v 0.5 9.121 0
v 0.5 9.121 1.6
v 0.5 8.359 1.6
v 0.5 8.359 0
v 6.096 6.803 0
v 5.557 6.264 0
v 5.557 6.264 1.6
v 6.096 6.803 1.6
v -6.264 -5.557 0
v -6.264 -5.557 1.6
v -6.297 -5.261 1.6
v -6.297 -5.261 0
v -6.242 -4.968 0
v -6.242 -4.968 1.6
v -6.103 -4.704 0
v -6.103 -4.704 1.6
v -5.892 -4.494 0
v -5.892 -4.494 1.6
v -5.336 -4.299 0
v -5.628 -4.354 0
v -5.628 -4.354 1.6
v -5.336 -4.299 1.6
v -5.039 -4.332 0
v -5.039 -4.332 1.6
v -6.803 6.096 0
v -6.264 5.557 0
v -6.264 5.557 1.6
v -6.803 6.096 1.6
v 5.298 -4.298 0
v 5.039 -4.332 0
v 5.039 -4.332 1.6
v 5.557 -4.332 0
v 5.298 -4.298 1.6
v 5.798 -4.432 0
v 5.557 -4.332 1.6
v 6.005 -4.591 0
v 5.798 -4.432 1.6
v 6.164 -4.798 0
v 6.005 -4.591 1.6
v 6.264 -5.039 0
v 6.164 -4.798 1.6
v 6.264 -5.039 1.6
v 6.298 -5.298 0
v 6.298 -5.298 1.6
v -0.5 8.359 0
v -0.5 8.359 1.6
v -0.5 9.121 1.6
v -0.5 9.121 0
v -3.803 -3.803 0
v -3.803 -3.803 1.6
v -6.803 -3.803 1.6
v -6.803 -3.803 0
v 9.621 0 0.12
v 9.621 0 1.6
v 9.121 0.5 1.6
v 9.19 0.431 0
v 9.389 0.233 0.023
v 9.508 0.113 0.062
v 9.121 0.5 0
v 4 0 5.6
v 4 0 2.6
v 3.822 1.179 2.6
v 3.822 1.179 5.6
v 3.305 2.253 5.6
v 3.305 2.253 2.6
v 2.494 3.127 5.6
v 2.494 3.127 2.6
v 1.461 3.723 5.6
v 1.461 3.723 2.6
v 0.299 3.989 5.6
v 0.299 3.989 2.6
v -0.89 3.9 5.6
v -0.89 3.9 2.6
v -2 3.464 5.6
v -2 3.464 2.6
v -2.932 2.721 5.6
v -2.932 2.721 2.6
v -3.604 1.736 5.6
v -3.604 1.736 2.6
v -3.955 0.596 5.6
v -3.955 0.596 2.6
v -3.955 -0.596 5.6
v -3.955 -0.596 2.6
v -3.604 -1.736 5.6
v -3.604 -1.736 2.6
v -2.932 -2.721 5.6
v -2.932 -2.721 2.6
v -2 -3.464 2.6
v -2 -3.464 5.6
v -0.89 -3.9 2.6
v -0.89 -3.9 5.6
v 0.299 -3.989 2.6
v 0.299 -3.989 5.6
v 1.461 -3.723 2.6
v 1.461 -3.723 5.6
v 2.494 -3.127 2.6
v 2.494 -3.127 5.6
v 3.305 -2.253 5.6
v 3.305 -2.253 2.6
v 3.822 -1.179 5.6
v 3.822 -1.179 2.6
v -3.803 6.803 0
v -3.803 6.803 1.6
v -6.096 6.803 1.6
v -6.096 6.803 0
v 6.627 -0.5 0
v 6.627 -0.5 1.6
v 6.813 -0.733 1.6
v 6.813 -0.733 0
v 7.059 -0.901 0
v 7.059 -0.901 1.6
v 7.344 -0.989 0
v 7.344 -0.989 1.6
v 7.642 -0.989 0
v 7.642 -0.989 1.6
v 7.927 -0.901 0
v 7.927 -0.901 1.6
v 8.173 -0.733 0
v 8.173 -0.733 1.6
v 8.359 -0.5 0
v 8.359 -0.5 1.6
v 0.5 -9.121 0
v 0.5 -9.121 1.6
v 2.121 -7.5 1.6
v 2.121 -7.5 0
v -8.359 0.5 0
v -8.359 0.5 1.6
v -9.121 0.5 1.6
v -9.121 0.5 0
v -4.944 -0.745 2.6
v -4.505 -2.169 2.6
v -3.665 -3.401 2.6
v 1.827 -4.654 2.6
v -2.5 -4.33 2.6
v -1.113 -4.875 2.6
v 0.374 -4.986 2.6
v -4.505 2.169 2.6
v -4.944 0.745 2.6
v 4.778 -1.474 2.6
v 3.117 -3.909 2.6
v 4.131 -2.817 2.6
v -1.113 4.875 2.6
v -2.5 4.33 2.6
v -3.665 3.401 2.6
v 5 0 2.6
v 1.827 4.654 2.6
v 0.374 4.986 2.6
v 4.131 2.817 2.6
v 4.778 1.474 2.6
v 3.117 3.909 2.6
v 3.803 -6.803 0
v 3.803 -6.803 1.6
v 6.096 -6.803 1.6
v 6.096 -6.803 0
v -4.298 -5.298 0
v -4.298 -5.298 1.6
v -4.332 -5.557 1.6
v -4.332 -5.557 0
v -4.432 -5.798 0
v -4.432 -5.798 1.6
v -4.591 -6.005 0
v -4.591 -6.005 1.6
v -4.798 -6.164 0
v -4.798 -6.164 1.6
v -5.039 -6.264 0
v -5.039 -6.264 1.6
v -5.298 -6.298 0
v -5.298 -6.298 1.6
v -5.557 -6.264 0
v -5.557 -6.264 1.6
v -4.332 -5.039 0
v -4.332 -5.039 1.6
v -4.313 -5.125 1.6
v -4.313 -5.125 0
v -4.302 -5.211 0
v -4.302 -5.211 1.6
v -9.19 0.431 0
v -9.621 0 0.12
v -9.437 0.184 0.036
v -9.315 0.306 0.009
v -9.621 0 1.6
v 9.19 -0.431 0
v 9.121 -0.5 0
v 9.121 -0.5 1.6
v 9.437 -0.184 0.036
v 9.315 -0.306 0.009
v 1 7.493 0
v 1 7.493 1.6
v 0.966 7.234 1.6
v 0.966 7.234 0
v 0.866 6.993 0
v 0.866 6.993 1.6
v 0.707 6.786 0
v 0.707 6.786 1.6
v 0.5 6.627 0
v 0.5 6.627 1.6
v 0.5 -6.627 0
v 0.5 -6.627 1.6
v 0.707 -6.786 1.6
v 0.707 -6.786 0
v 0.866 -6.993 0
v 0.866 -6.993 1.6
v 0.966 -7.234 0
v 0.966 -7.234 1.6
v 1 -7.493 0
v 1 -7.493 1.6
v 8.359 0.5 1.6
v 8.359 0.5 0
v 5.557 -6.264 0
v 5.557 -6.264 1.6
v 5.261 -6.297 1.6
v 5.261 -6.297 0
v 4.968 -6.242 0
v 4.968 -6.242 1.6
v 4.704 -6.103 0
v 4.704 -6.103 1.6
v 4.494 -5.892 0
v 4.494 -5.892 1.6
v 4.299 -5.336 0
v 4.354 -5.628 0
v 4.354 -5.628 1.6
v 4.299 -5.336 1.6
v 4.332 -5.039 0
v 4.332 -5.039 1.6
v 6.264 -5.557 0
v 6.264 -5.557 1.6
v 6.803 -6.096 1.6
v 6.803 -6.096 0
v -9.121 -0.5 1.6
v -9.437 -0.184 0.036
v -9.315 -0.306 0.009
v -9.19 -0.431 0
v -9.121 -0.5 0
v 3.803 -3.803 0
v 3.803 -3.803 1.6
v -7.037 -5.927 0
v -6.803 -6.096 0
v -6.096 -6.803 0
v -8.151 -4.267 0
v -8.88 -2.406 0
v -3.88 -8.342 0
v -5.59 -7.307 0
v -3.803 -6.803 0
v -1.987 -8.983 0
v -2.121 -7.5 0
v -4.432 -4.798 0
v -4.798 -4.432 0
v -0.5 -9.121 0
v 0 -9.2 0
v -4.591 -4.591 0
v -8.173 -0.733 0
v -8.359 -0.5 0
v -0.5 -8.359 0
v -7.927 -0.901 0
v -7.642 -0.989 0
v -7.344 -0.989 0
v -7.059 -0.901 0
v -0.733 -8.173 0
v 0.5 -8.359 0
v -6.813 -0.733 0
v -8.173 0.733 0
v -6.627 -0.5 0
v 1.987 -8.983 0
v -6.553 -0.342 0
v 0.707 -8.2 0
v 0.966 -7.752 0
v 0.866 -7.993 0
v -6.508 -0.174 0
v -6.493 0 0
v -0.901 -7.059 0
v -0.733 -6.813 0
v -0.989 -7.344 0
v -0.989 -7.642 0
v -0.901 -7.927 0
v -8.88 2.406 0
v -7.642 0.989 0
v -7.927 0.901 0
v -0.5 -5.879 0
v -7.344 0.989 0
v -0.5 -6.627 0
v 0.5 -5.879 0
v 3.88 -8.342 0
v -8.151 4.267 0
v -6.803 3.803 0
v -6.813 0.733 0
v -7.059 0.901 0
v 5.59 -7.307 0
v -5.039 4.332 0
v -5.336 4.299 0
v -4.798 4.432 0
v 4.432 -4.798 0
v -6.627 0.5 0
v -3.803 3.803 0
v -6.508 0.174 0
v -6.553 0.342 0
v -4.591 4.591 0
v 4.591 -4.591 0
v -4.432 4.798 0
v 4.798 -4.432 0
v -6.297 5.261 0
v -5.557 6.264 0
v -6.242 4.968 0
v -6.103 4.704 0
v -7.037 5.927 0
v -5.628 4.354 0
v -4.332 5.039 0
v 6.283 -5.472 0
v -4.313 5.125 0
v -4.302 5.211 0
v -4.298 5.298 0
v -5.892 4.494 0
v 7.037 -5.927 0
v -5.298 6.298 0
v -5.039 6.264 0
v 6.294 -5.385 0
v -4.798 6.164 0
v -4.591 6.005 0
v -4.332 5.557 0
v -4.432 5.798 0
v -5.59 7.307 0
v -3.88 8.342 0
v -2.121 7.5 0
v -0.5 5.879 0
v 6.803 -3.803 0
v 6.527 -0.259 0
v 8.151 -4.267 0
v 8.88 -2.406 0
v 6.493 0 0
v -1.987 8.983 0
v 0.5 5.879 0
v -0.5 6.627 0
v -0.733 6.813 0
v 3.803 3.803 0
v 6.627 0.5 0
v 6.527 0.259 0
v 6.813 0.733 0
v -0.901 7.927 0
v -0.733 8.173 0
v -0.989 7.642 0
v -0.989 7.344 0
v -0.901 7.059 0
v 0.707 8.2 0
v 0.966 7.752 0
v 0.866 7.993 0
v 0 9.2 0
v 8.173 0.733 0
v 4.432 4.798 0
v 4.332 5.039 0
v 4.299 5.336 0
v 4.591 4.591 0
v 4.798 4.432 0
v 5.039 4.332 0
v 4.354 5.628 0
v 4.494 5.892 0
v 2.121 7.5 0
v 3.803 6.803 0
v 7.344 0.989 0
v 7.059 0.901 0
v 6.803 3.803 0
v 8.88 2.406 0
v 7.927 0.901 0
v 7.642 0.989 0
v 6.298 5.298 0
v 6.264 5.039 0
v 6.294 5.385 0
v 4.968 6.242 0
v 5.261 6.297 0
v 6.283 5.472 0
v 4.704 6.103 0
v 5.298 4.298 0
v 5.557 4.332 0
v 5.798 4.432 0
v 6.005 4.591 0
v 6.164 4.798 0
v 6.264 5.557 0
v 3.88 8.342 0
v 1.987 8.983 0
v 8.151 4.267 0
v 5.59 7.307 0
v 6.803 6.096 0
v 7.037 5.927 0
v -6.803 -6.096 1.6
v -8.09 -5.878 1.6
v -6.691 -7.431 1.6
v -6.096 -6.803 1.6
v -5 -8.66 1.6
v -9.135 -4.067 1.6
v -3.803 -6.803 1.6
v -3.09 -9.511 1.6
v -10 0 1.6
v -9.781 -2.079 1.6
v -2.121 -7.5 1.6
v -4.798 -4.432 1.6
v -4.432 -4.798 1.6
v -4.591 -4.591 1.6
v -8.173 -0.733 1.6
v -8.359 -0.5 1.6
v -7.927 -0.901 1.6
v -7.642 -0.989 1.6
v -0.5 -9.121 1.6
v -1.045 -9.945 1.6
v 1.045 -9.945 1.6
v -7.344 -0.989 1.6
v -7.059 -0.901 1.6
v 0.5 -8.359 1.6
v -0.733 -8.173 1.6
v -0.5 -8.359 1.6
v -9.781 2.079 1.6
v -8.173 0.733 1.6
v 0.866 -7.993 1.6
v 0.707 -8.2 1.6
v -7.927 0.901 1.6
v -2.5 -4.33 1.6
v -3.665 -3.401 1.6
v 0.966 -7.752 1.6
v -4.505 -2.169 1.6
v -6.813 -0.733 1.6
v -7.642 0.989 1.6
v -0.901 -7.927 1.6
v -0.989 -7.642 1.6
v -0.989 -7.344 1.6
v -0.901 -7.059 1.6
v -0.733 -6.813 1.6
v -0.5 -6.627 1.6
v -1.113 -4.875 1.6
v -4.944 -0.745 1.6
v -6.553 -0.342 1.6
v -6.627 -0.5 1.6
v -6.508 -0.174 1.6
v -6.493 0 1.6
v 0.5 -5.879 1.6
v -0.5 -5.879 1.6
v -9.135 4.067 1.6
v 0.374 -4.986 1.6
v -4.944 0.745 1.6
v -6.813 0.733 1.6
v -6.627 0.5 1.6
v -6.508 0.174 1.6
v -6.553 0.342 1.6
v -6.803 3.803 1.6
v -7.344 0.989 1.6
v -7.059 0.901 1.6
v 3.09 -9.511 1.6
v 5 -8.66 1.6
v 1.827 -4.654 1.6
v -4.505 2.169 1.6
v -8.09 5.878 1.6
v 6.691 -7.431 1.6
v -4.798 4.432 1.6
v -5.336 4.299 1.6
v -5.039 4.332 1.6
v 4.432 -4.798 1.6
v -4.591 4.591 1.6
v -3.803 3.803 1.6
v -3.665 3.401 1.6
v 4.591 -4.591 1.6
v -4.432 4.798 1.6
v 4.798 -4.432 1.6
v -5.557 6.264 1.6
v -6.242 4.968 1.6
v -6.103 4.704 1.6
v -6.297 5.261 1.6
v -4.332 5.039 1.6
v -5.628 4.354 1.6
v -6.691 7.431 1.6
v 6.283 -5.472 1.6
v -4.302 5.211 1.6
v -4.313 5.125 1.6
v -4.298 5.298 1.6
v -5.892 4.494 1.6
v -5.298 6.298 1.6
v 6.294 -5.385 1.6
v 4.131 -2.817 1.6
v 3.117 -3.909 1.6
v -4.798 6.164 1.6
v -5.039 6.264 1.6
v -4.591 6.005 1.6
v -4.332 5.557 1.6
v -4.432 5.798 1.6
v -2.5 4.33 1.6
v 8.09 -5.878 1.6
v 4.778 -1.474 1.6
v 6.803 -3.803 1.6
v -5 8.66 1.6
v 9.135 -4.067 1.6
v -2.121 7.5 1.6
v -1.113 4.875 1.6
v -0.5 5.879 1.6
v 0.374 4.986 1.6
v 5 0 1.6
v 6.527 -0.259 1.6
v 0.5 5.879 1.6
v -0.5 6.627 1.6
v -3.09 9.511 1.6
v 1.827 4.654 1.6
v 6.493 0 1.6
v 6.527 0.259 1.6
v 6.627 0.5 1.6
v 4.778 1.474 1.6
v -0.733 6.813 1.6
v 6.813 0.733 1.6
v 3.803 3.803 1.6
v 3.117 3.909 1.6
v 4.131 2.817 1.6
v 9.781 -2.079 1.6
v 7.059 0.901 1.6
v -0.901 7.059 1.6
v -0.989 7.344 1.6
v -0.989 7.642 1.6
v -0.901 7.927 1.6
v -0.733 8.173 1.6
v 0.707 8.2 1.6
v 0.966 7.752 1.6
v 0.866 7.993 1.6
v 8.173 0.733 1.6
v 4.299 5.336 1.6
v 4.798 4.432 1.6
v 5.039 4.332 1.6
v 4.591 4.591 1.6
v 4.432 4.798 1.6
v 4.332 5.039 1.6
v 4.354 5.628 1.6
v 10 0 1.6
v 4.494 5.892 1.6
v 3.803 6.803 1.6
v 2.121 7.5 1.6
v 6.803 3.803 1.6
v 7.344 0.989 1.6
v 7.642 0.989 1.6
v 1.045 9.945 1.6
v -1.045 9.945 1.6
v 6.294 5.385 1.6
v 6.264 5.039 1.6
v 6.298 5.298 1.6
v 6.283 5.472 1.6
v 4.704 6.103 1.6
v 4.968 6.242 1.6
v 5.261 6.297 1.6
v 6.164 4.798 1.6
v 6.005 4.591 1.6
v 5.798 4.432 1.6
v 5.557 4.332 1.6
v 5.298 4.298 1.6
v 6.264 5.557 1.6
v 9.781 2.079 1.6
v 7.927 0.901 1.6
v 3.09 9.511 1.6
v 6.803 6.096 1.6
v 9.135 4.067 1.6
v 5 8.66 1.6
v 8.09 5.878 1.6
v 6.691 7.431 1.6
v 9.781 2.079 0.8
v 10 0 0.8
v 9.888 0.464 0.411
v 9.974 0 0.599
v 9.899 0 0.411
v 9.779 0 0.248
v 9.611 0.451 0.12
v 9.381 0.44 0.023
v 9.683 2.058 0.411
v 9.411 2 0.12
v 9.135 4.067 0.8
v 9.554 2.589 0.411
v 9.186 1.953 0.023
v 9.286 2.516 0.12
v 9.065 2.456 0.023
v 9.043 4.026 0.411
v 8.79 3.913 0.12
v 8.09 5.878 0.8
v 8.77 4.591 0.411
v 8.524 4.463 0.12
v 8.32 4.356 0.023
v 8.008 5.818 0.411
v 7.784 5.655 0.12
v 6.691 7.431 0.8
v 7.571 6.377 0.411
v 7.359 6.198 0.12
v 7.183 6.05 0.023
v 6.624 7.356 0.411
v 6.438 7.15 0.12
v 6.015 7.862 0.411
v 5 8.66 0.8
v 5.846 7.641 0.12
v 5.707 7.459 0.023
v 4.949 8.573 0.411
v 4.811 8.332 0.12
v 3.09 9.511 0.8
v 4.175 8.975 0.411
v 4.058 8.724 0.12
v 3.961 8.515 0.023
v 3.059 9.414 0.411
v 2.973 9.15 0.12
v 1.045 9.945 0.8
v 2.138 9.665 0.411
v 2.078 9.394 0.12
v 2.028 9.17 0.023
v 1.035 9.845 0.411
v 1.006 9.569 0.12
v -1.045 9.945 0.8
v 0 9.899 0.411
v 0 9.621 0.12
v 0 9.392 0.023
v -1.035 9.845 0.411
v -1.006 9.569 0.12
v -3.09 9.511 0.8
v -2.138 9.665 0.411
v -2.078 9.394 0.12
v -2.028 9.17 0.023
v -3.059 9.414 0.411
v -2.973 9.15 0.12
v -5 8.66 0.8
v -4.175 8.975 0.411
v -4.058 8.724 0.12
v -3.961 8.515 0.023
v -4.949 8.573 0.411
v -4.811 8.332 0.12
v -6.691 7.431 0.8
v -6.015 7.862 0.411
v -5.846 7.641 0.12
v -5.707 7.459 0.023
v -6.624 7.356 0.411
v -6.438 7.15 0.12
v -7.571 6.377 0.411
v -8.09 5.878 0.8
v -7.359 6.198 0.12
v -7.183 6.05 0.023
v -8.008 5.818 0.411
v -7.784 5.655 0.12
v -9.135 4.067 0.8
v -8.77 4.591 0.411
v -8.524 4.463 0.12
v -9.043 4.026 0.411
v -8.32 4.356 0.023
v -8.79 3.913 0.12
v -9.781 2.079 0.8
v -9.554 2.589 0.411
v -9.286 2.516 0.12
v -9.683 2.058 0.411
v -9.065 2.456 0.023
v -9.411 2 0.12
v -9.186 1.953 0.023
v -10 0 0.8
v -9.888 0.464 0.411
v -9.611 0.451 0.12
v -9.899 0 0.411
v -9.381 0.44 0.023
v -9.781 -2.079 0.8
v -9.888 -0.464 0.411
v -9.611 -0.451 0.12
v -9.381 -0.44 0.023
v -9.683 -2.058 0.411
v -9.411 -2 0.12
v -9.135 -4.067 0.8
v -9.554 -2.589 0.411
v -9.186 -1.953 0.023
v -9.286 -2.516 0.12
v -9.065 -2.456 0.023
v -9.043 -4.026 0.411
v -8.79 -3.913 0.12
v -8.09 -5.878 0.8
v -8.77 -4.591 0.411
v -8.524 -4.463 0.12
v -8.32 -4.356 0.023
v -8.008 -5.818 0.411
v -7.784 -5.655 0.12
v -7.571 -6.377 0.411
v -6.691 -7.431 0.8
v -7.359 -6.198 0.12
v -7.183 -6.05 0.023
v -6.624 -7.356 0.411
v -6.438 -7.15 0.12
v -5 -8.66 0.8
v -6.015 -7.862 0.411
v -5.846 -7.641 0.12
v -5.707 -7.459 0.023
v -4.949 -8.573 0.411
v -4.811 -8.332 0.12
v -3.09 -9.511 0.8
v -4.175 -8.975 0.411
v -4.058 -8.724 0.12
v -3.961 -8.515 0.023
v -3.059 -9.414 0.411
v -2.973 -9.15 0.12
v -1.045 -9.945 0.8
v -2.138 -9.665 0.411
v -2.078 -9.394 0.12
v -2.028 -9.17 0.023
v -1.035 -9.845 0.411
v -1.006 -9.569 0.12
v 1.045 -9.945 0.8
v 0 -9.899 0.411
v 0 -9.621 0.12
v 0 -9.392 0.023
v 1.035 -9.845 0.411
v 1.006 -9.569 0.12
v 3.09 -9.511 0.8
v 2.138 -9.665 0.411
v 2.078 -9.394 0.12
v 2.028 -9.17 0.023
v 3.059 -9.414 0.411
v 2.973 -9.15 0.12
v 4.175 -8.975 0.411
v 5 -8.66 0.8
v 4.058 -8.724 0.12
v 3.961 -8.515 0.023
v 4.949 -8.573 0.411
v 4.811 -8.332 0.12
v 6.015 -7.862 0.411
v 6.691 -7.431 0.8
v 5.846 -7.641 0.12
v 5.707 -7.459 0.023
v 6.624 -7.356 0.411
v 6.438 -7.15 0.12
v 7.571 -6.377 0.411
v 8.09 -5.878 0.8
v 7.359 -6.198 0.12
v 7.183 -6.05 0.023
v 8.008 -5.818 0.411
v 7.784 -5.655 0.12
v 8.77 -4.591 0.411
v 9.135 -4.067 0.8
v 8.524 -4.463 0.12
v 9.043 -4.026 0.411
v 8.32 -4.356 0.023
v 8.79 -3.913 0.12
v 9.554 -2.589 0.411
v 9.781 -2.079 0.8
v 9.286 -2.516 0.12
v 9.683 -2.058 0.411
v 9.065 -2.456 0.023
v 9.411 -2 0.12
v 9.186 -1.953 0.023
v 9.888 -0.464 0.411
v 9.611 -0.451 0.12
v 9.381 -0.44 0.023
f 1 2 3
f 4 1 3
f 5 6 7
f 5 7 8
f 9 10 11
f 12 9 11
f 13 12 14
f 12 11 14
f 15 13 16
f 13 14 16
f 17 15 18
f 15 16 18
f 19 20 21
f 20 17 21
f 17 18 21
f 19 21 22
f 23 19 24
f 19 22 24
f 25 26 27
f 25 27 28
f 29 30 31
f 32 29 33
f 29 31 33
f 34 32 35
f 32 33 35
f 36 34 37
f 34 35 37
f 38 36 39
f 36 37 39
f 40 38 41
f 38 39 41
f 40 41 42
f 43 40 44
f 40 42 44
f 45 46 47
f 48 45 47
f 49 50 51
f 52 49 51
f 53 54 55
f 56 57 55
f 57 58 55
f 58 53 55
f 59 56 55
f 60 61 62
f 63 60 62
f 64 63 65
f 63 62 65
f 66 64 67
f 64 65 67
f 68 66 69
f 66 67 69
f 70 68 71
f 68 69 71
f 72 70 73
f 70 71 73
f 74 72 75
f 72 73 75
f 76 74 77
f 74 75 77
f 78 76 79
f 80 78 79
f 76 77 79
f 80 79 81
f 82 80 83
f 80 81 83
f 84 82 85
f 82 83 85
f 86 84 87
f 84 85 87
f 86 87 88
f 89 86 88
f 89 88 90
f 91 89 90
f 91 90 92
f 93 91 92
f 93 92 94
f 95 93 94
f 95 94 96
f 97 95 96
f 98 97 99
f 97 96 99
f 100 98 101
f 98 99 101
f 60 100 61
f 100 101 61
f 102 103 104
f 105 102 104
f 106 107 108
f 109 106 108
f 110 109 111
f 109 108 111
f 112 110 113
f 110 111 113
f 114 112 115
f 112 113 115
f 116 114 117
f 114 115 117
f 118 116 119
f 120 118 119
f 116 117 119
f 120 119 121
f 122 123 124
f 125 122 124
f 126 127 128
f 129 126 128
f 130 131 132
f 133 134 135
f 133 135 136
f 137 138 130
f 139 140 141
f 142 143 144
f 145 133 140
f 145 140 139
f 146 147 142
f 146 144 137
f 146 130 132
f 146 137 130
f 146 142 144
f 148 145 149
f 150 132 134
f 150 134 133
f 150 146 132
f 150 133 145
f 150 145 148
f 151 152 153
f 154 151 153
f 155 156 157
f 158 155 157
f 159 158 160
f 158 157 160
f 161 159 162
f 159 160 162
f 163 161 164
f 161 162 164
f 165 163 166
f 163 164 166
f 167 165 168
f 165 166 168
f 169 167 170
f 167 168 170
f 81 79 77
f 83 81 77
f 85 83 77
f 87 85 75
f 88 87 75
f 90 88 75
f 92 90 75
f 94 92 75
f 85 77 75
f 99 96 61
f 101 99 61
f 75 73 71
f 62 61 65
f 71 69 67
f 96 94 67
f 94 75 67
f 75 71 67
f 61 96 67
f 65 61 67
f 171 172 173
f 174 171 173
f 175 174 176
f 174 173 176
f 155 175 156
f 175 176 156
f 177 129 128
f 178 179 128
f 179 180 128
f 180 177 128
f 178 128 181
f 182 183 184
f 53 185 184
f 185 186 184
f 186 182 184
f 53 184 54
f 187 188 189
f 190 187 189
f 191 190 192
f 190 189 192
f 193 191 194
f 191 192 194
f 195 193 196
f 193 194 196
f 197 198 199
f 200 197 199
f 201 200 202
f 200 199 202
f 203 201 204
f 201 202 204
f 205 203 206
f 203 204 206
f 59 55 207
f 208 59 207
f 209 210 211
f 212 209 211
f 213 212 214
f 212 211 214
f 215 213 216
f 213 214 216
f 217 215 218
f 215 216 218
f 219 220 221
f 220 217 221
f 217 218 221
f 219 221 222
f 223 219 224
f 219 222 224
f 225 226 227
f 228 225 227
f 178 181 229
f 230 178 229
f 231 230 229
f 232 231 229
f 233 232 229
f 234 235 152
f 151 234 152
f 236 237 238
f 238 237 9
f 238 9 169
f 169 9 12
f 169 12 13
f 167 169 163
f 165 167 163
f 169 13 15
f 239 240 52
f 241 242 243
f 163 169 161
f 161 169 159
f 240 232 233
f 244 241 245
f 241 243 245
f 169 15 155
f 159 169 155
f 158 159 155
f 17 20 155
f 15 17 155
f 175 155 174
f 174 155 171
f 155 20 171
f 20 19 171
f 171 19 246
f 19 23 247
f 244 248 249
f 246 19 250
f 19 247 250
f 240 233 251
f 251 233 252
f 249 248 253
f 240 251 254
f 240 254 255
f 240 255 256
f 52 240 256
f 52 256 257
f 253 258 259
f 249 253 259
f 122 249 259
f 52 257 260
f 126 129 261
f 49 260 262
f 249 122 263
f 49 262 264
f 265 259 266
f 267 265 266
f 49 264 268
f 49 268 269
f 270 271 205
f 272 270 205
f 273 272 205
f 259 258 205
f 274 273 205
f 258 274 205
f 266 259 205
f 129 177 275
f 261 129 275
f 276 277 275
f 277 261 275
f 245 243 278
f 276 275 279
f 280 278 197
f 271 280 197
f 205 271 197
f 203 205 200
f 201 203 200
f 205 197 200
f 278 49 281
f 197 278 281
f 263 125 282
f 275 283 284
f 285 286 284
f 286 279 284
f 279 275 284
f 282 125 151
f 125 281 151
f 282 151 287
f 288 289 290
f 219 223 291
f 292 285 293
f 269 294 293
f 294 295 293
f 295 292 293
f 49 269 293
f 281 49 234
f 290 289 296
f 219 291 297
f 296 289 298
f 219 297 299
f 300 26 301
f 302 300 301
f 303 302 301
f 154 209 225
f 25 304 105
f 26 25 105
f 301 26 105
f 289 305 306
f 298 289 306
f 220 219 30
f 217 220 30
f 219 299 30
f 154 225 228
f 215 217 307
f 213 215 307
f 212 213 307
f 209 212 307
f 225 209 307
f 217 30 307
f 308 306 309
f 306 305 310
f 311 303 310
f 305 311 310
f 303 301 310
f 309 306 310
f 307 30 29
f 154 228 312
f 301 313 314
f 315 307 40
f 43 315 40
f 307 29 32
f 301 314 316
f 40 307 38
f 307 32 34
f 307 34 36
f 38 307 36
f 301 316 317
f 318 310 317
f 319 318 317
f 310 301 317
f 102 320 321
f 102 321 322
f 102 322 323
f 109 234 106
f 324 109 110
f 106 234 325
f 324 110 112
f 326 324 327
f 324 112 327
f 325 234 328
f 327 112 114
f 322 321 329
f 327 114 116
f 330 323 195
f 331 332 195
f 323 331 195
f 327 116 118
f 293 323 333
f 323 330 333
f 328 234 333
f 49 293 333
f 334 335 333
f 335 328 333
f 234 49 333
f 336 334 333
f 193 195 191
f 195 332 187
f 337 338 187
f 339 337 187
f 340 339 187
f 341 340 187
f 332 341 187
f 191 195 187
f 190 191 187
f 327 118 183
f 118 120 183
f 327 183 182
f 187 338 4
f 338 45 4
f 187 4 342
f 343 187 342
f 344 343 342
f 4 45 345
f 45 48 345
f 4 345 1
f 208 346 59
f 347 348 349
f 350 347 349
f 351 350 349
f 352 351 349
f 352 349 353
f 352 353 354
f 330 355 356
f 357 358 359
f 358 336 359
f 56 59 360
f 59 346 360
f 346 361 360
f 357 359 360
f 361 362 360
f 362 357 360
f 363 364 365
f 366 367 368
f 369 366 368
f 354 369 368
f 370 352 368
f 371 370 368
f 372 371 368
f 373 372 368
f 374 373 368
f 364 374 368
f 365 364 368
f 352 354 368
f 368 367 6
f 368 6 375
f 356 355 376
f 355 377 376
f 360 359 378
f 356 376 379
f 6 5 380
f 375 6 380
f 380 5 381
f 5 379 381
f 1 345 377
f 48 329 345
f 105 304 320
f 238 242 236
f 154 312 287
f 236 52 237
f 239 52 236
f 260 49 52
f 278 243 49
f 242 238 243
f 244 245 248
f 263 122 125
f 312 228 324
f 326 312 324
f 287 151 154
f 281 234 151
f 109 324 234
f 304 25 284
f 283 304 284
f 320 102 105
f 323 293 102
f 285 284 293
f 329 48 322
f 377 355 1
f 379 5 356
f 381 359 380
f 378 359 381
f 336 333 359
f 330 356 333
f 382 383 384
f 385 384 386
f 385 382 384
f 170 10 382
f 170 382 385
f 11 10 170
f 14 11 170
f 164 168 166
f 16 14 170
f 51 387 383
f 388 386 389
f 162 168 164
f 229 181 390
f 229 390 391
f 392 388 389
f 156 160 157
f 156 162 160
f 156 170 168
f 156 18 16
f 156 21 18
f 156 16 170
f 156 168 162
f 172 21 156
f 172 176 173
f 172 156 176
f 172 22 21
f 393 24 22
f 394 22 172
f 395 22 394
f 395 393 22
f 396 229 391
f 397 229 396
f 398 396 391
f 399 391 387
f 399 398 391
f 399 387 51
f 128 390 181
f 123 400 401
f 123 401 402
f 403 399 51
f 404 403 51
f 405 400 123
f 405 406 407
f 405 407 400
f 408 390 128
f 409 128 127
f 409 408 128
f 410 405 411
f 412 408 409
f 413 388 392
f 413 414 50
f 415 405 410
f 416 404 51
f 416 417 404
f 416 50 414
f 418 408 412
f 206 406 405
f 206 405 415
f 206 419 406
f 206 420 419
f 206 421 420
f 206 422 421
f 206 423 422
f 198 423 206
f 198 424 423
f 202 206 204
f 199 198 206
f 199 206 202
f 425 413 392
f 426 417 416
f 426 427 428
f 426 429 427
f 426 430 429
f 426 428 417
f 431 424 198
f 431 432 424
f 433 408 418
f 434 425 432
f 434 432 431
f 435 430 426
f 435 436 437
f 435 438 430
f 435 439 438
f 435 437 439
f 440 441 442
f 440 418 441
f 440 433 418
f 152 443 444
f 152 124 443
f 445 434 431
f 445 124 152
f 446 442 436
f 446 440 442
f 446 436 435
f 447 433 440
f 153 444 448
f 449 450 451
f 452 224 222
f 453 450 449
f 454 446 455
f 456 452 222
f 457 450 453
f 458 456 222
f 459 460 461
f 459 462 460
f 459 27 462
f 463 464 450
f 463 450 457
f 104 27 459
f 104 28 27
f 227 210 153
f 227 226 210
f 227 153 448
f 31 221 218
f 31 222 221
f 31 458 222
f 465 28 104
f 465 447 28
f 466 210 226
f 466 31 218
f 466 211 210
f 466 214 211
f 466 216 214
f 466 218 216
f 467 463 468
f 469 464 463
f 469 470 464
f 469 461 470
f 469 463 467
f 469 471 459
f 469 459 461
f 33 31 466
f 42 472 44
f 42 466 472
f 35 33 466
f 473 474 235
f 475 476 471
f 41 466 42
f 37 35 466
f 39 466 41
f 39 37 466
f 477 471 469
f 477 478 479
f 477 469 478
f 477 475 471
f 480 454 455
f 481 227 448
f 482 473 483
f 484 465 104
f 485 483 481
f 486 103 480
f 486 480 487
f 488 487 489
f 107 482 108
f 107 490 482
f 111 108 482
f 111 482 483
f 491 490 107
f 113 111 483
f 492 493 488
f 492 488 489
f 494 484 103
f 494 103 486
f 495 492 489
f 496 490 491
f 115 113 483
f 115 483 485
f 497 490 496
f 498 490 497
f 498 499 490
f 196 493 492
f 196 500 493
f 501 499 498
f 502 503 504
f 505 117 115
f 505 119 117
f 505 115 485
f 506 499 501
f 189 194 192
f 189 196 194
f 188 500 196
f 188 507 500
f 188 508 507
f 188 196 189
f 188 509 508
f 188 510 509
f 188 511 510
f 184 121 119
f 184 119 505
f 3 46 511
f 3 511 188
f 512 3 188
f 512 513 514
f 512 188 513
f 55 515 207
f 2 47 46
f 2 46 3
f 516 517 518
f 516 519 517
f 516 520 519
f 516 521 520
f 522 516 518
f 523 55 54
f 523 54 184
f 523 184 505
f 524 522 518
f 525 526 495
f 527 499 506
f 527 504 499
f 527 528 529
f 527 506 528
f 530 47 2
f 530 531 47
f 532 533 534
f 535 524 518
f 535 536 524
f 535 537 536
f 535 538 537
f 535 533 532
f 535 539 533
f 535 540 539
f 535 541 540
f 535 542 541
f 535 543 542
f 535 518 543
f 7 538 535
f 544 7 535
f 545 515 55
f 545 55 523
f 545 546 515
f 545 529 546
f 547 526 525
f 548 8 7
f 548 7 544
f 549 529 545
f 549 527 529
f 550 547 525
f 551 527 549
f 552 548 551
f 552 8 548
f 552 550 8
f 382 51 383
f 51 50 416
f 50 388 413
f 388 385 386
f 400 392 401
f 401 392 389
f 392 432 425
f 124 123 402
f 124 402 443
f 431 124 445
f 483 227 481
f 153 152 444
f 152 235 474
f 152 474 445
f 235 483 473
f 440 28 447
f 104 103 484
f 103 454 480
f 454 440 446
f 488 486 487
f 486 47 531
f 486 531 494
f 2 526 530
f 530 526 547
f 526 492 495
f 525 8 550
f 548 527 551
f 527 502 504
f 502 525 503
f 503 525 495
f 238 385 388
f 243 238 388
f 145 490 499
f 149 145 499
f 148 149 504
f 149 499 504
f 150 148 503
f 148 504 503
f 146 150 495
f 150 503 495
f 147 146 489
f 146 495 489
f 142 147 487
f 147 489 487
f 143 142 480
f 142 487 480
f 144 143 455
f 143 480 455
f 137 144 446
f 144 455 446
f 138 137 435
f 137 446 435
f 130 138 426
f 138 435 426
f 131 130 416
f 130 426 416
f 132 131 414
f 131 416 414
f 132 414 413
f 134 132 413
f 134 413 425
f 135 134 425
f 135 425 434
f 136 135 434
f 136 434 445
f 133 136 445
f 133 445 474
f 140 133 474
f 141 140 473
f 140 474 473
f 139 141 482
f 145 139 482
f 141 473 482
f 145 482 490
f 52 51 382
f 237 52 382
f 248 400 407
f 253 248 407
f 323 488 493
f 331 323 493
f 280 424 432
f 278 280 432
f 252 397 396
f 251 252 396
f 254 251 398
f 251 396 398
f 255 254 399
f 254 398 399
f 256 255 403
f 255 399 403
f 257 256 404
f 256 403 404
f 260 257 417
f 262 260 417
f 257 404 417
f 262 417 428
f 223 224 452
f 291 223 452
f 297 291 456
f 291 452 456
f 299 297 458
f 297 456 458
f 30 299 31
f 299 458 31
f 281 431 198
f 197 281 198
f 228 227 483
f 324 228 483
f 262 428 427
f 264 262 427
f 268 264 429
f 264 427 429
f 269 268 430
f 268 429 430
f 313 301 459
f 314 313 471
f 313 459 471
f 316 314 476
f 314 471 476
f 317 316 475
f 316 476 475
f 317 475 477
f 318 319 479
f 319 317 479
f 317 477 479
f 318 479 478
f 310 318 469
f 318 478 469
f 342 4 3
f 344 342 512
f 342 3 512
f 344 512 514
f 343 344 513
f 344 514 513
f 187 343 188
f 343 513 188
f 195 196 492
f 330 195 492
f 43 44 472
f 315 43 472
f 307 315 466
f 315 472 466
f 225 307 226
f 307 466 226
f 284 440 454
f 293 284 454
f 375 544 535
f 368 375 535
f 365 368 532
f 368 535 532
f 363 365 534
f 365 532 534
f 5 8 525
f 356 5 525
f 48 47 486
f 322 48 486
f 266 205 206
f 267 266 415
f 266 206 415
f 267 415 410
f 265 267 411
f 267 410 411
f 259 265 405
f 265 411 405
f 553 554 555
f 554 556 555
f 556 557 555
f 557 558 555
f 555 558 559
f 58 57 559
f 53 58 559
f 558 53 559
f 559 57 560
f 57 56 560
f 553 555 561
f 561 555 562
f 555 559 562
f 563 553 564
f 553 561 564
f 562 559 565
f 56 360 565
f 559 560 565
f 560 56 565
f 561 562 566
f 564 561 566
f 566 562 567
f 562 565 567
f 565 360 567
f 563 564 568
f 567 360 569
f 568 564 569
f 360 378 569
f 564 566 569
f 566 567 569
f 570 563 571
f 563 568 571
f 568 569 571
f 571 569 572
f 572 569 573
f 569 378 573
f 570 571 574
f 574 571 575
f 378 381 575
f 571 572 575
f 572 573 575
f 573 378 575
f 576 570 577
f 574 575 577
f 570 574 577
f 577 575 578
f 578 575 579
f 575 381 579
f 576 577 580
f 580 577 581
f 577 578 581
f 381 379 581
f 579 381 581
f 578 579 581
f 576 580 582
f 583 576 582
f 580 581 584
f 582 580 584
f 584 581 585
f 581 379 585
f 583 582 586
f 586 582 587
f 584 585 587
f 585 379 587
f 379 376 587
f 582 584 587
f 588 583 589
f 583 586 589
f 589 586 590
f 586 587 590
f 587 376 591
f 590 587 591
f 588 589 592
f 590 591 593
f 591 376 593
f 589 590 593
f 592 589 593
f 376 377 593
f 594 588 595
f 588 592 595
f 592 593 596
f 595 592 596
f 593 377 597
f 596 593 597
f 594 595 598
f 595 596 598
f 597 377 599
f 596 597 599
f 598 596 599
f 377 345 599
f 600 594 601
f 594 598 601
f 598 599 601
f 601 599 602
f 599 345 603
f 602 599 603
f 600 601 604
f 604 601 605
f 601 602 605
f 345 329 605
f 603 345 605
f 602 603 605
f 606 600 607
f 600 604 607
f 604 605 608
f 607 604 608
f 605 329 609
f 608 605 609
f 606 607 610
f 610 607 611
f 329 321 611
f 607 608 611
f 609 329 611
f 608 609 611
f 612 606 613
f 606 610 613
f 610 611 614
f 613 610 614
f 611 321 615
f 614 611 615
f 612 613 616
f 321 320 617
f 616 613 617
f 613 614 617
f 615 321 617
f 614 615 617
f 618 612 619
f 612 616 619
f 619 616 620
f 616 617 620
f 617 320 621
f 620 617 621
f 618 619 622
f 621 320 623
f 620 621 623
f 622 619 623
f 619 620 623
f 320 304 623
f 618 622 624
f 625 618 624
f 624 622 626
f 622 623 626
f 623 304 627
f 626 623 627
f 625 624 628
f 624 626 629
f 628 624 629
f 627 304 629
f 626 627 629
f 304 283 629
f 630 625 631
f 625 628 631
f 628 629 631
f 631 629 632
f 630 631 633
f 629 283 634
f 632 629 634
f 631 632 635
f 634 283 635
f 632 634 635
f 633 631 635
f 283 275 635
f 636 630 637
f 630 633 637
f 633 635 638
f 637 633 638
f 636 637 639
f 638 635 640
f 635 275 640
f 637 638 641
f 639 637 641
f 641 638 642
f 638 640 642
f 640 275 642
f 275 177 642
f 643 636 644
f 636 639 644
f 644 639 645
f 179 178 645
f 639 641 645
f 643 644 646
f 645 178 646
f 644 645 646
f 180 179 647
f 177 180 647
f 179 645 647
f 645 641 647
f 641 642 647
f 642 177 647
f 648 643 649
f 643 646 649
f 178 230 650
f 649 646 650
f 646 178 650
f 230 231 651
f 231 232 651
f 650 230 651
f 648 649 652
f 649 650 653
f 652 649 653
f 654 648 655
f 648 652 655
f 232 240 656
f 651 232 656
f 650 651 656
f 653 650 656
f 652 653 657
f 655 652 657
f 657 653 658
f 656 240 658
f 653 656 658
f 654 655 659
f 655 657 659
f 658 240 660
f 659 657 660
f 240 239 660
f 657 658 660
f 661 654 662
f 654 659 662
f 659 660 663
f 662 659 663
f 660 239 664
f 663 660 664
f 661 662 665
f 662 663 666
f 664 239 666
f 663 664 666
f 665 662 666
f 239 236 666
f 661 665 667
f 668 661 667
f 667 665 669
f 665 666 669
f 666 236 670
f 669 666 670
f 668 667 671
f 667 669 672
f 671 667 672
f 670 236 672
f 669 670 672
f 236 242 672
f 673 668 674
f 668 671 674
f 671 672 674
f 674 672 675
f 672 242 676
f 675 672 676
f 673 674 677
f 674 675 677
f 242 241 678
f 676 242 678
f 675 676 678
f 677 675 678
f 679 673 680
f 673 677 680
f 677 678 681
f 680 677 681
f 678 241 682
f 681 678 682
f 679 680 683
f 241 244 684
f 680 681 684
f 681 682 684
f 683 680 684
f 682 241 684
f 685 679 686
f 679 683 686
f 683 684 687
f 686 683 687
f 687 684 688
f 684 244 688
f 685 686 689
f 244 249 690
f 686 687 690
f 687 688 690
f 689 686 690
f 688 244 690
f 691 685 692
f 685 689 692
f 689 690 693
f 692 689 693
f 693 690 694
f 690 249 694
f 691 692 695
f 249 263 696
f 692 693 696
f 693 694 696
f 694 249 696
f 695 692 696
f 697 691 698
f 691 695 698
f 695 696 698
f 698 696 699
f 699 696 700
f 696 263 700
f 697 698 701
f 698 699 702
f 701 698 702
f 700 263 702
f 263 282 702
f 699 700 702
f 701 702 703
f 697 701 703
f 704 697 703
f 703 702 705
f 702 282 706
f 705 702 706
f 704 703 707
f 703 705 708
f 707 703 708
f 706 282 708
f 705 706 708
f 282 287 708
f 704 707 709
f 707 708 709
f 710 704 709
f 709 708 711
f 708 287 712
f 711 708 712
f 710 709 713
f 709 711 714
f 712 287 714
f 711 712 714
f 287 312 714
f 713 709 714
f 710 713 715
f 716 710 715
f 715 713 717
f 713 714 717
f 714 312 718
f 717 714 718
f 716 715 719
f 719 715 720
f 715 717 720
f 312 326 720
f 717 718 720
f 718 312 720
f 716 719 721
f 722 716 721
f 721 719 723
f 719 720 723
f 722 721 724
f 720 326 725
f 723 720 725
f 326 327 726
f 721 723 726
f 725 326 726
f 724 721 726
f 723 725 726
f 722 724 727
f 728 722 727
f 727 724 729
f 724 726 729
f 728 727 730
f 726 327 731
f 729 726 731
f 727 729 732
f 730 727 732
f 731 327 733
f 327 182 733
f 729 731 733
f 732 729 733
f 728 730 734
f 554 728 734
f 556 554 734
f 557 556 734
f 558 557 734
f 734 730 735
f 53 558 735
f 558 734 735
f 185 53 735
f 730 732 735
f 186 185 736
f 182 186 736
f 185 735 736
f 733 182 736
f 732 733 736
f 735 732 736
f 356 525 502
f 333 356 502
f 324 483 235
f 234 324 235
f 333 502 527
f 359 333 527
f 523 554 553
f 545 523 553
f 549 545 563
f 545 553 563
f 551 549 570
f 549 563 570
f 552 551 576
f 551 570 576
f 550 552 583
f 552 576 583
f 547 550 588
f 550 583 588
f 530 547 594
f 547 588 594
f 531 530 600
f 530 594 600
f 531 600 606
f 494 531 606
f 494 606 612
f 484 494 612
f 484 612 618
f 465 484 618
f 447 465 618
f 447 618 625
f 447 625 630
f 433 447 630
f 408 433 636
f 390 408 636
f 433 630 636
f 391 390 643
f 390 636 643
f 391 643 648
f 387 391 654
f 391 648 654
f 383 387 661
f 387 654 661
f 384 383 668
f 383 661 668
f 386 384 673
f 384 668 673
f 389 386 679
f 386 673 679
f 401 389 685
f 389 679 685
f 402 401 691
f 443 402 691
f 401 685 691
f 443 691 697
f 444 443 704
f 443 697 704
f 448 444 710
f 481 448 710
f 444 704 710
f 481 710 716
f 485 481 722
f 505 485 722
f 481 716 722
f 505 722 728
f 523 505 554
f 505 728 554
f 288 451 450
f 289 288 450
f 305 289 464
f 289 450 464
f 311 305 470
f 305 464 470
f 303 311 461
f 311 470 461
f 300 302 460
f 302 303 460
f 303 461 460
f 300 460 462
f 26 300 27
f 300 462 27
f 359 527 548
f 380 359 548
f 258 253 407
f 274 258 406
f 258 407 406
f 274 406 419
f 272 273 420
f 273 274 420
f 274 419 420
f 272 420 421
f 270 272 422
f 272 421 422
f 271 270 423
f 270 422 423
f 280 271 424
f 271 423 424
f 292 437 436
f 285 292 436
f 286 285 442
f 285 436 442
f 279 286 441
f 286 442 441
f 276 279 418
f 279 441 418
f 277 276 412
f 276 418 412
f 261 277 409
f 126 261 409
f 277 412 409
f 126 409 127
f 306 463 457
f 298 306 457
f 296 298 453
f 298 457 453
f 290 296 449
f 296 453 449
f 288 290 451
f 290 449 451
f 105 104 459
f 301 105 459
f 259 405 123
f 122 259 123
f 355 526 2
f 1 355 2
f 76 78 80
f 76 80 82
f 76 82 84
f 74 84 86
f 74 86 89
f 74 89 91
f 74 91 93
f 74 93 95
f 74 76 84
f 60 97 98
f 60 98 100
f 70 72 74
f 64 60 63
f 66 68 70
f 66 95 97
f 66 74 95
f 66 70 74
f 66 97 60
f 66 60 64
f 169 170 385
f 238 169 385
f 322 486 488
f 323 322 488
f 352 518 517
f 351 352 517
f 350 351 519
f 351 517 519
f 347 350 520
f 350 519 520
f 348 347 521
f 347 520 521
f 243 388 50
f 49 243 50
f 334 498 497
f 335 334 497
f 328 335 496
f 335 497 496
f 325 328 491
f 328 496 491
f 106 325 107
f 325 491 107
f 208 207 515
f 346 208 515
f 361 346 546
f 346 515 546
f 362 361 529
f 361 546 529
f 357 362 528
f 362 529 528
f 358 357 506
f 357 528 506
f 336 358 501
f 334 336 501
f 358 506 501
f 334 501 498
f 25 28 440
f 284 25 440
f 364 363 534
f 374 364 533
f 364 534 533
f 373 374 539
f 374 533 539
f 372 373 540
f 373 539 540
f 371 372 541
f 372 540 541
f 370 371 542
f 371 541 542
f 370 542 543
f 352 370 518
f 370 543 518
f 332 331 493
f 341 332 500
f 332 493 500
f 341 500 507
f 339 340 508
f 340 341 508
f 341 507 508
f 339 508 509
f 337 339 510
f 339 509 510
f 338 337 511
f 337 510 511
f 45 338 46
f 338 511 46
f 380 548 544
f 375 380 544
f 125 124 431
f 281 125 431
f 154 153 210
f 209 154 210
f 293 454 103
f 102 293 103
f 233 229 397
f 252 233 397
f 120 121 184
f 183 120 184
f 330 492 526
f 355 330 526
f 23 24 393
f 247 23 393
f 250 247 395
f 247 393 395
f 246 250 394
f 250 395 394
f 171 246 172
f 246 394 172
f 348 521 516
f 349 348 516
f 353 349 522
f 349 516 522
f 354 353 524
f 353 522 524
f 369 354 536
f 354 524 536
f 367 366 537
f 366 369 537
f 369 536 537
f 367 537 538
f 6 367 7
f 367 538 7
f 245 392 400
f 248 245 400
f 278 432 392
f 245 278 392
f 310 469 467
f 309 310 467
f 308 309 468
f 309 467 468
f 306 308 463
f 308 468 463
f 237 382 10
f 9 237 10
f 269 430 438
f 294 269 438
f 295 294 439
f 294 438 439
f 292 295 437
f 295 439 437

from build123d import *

# Parameters (mm, degrees)
F0_R     = 10
F1_DEPTH = 1.6
F2_R     = 5
F3_DEPTH = 1
F4_R     = 4
F5_DEPTH = 3
F7_R     = 0.8
F8_DEPTH = 25


with BuildPart() as f1:
    # F0 (on Top) → F1 (new body)
    with BuildSketch(Plane.XY):
        Circle(F0_R)
    extrude(amount=F1_DEPTH)

    # F2 (on face) → F3 (join)
    with BuildSketch(Plane.XY.offset(1.6)):
        Circle(F2_R)
    extrude(amount=F3_DEPTH)

    # F7
    f7_edges = [f1.edges().sort_by_distance(p)[0] for p in [
        (-10, 0, 0),
    ]]
    fillet(f7_edges, radius=F7_R)

    # F6 (on face) → F8 (cut)
    with BuildSketch(Plane.XY.offset(1.6)):
        with BuildLine():
            Line((-2.1213203436, 7.5), (-0.5, 5.8786796564))
            Line((-0.5, 5.8786796564), (-0.5, 6.6267208227))
            ThreePointArc((-0.5, 6.6267208227), (-1, 7.4927462265), (-0.5, 8.3587716303))
            Line((-0.5, 8.3587716303), (-0.5, 9.1213203436))
            Line((-0.5, 9.1213203436), (-2.1213203436, 7.5))
        make_face()
        with BuildLine():
            Line((0.5, 6.6267208227), (0.5, 5.8786796564))
            Line((0.5, 5.8786796564), (2.1213203436, 7.5))
            Line((2.1213203436, 7.5), (0.5, 9.1213203436))
            Line((0.5, 9.1213203436), (0.5, 8.3587716303))
            ThreePointArc((0.5, 8.3587716303), (0.8660254038, 7.9927462265), (1, 7.4927462265))
            ThreePointArc((1, 7.4927462265), (0.8660254038, 6.9927462265), (0.5, 6.6267208227))
        make_face()
        with BuildLine():
            Line((6.0961940777, 6.8033008589), (3.8033008589, 6.8033008589))
            Line((3.8033008589, 6.8033008589), (3.8033008589, 4.5104076401))
            Line((3.8033008589, 4.5104076401), (4.3322458402, 5.0393526214))
            ThreePointArc((4.3322458402, 5.0393526214), (4.5910648853, 6.0052784476), (5.5569907116, 6.2640974927))
            Line((5.5569907116, 6.2640974927), (6.0961940777, 6.8033008589))
        make_face()
        with BuildLine():
            Line((6.8033008589, 3.8033008589), (6.8033008589, 6.0961940777))
            Line((6.8033008589, 6.0961940777), (6.2640974927, 5.5569907116))
            ThreePointArc((6.2640974927, 5.5569907116), (6.2896165278, 5.4286978587), (6.2981716665, 5.2981716665))
            ThreePointArc((6.2981716665, 5.2981716665), (5.9069330955, 4.5048183262), (5.0393526214, 4.3322458402))
            Line((5.0393526214, 4.3322458402), (4.5104076401, 3.8033008589))
            Line((4.5104076401, 3.8033008589), (6.8033008589, 3.8033008589))
        make_face()
        with BuildLine():
            ThreePointArc((8.4927462265, 0), (8.4586720528, 0.2588190451), (8.3587716303, 0.5))
            Line((8.3587716303, 0.5), (6.6267208227, 0.5))
            ThreePointArc((6.6267208227, 0.5), (6.4927462265, 0), (6.6267208227, -0.5))
            Line((6.6267208227, -0.5), (8.3587716303, -0.5))
            ThreePointArc((8.3587716303, -0.5), (8.4586720528, -0.2588190451), (8.4927462265, 0))
        make_face()
        with BuildLine():
            Line((9.6213203436, 0), (9.1213203436, 0.5))
            Line((9.1213203436, 0.5), (8.3587716303, 0.5))
            ThreePointArc((8.3587716303, 0.5), (8.4586720528, 0.2588190451), (8.4927462265, 0))
            ThreePointArc((8.4927462265, 0), (8.4586720528, -0.2588190451), (8.3587716303, -0.5))
            Line((8.3587716303, -0.5), (9.1213203436, -0.5))
            Line((9.1213203436, -0.5), (9.6213203436, 0))
        make_face()
        with BuildLine():
            Line((6.6267208227, 0.5), (8.3587716303, 0.5))
            ThreePointArc((8.3587716303, 0.5), (7.4927462265, 1), (6.6267208227, 0.5))
        make_face()
        with BuildLine():
            Line((8.3587716303, -0.5), (6.6267208227, -0.5))
            ThreePointArc((6.6267208227, -0.5), (7.4927462265, -1), (8.3587716303, -0.5))
        make_face()
        with BuildLine():
            Line((-9.6213203436, 0), (-9.1213203436, -0.5))
            Line((-9.1213203436, -0.5), (-8.3587716303, -0.5))
            ThreePointArc((-8.3587716303, -0.5), (-8.4927462265, 0), (-8.3587716303, 0.5))
            Line((-8.3587716303, 0.5), (-9.1213203436, 0.5))
            Line((-9.1213203436, 0.5), (-9.6213203436, 0))
        make_face()
        with BuildLine():
            ThreePointArc((-6.6267208227, 0.5), (-7.4927462265, 1), (-8.3587716303, 0.5))
            Line((-8.3587716303, 0.5), (-6.6267208227, 0.5))
        make_face()
        with BuildLine():
            ThreePointArc((-8.3587716303, 0.5), (-8.4927462265, 0), (-8.3587716303, -0.5))
            Line((-8.3587716303, -0.5), (-6.6267208227, -0.5))
            ThreePointArc((-6.6267208227, -0.5), (-6.5268204002, -0.2588190451), (-6.4927462265, 0))
            ThreePointArc((-6.4927462265, 0), (-6.5268204002, 0.2588190451), (-6.6267208227, 0.5))
            Line((-6.6267208227, 0.5), (-8.3587716303, 0.5))
        make_face()
        with BuildLine():
            Line((-6.6267208227, -0.5), (-8.3587716303, -0.5))
            ThreePointArc((-8.3587716303, -0.5), (-7.4927462265, -1), (-6.6267208227, -0.5))
        make_face()
        with BuildLine():
            Line((-2.1213203436, -7.5), (-0.5, -9.1213203436))
            Line((-0.5, -9.1213203436), (-0.5, -8.3587716303))
            ThreePointArc((-0.5, -8.3587716303), (-1, -7.4927462265), (-0.5, -6.6267208227))
            Line((-0.5, -6.6267208227), (-0.5, -5.8786796564))
            Line((-0.5, -5.8786796564), (-2.1213203436, -7.5))
        make_face()
        with BuildLine():
            Line((0.5, -9.1213203436), (2.1213203436, -7.5))
            Line((2.1213203436, -7.5), (0.5, -5.8786796564))
            Line((0.5, -5.8786796564), (0.5, -6.6267208227))
            ThreePointArc((0.5, -6.6267208227), (0.8660254038, -6.9927462265), (1, -7.4927462265))
            ThreePointArc((1, -7.4927462265), (0.8660254038, -7.9927462265), (0.5, -8.3587716303))
            Line((0.5, -8.3587716303), (0.5, -9.1213203436))
        make_face()
        with BuildLine():
            Line((6.8033008589, -6.0961940777), (6.8033008589, -3.8033008589))
            Line((6.8033008589, -3.8033008589), (4.5104076401, -3.8033008589))
            Line((4.5104076401, -3.8033008589), (5.0393526214, -4.3322458402))
            ThreePointArc((5.0393526214, -4.3322458402), (5.9069330955, -4.5048183262), (6.2981716665, -5.2981716665))
            ThreePointArc((6.2981716665, -5.2981716665), (6.2896165278, -5.4286978587), (6.2640974927, -5.5569907116))
            Line((6.2640974927, -5.5569907116), (6.8033008589, -6.0961940777))
        make_face()
        with BuildLine():
            Line((5.0393526214, -4.3322458402), (4.5104076401, -3.8033008589))
            Line((4.5104076401, -3.8033008589), (3.8033008589, -3.8033008589))
            Line((3.8033008589, -3.8033008589), (3.8033008589, -4.5104076401))
            Line((3.8033008589, -4.5104076401), (4.3322458402, -5.0393526214))
            ThreePointArc((4.3322458402, -5.0393526214), (4.5910648853, -4.5910648853), (5.0393526214, -4.3322458402))
        make_face()
        with BuildLine():
            Line((3.8033008589, -6.8033008589), (6.0961940777, -6.8033008589))
            Line((6.0961940777, -6.8033008589), (5.5569907116, -6.2640974927))
            ThreePointArc((5.5569907116, -6.2640974927), (4.5910648853, -6.0052784476), (4.3322458402, -5.0393526214))
            Line((4.3322458402, -5.0393526214), (3.8033008589, -4.5104076401))
            Line((3.8033008589, -4.5104076401), (3.8033008589, -6.8033008589))
        make_face()
        with BuildLine():
            Line((-6.8033008589, -3.8033008589), (-6.8033008589, -6.0961940777))
            Line((-6.8033008589, -6.0961940777), (-6.2640974927, -5.5569907116))
            ThreePointArc((-6.2640974927, -5.5569907116), (-6.0052784476, -4.5910648853), (-5.0393526214, -4.3322458402))
            Line((-5.0393526214, -4.3322458402), (-4.5104076401, -3.8033008589))
            Line((-4.5104076401, -3.8033008589), (-6.8033008589, -3.8033008589))
        make_face()
        with BuildLine():
            Line((-4.3322458402, -5.0393526214), (-3.8033008589, -4.5104076401))
            Line((-3.8033008589, -4.5104076401), (-3.8033008589, -3.8033008589))
            Line((-3.8033008589, -3.8033008589), (-4.5104076401, -3.8033008589))
            Line((-4.5104076401, -3.8033008589), (-5.0393526214, -4.3322458402))
            ThreePointArc((-5.0393526214, -4.3322458402), (-4.5910648853, -4.5910648853), (-4.3322458402, -5.0393526214))
        make_face()
        with BuildLine():
            Line((-6.0961940777, -6.8033008589), (-3.8033008589, -6.8033008589))
            Line((-3.8033008589, -6.8033008589), (-3.8033008589, -4.5104076401))
            Line((-3.8033008589, -4.5104076401), (-4.3322458402, -5.0393526214))
            ThreePointArc((-4.3322458402, -5.0393526214), (-4.3067268051, -5.1676454742), (-4.2981716665, -5.2981716665))
            ThreePointArc((-4.2981716665, -5.2981716665), (-4.6894102375, -6.0915250068), (-5.5569907116, -6.2640974927))
            Line((-5.5569907116, -6.2640974927), (-6.0961940777, -6.8033008589))
        make_face()
        with BuildLine():
            Line((4.3322458402, 5.0393526214), (3.8033008589, 4.5104076401))
            Line((3.8033008589, 4.5104076401), (3.8033008589, 3.8033008589))
            Line((3.8033008589, 3.8033008589), (4.5104076401, 3.8033008589))
            Line((4.5104076401, 3.8033008589), (5.0393526214, 4.3322458402))
            ThreePointArc((5.0393526214, 4.3322458402), (4.5910648853, 4.5910648853), (4.3322458402, 5.0393526214))
        make_face()
        with BuildLine():
            Line((-6.8033008589, 6.0961940777), (-6.8033008589, 3.8033008589))
            Line((-6.8033008589, 3.8033008589), (-4.5104076401, 3.8033008589))
            Line((-4.5104076401, 3.8033008589), (-5.0393526214, 4.3322458402))
            ThreePointArc((-5.0393526214, 4.3322458402), (-6.0052784476, 4.5910648853), (-6.2640974927, 5.5569907116))
            Line((-6.2640974927, 5.5569907116), (-6.8033008589, 6.0961940777))
        make_face()
        with BuildLine():
            Line((-5.0393526214, 4.3322458402), (-4.5104076401, 3.8033008589))
            Line((-4.5104076401, 3.8033008589), (-3.8033008589, 3.8033008589))
            Line((-3.8033008589, 3.8033008589), (-3.8033008589, 4.5104076401))
            Line((-3.8033008589, 4.5104076401), (-4.3322458402, 5.0393526214))
            ThreePointArc((-4.3322458402, 5.0393526214), (-4.5910648853, 4.5910648853), (-5.0393526214, 4.3322458402))
        make_face()
        with BuildLine():
            Line((-3.8033008589, 6.8033008589), (-6.0961940777, 6.8033008589))
            Line((-6.0961940777, 6.8033008589), (-5.5569907116, 6.2640974927))
            ThreePointArc((-5.5569907116, 6.2640974927), (-4.6894102375, 6.0915250068), (-4.2981716665, 5.2981716665))
            ThreePointArc((-4.2981716665, 5.2981716665), (-4.3067268051, 5.1676454742), (-4.3322458402, 5.0393526214))
            Line((-4.3322458402, 5.0393526214), (-3.8033008589, 4.5104076401))
            Line((-3.8033008589, 4.5104076401), (-3.8033008589, 6.8033008589))
        make_face()
    extrude(amount=-F8_DEPTH, mode=Mode.SUBTRACT)


with BuildPart() as f5:
    # F4 (on face) → F5 (new body)
    with BuildSketch(Plane.XY.offset(2.6)):
        Circle(F4_R)
    extrude(amount=F5_DEPTH)


solid = Compound([f1.part, f5.part])
